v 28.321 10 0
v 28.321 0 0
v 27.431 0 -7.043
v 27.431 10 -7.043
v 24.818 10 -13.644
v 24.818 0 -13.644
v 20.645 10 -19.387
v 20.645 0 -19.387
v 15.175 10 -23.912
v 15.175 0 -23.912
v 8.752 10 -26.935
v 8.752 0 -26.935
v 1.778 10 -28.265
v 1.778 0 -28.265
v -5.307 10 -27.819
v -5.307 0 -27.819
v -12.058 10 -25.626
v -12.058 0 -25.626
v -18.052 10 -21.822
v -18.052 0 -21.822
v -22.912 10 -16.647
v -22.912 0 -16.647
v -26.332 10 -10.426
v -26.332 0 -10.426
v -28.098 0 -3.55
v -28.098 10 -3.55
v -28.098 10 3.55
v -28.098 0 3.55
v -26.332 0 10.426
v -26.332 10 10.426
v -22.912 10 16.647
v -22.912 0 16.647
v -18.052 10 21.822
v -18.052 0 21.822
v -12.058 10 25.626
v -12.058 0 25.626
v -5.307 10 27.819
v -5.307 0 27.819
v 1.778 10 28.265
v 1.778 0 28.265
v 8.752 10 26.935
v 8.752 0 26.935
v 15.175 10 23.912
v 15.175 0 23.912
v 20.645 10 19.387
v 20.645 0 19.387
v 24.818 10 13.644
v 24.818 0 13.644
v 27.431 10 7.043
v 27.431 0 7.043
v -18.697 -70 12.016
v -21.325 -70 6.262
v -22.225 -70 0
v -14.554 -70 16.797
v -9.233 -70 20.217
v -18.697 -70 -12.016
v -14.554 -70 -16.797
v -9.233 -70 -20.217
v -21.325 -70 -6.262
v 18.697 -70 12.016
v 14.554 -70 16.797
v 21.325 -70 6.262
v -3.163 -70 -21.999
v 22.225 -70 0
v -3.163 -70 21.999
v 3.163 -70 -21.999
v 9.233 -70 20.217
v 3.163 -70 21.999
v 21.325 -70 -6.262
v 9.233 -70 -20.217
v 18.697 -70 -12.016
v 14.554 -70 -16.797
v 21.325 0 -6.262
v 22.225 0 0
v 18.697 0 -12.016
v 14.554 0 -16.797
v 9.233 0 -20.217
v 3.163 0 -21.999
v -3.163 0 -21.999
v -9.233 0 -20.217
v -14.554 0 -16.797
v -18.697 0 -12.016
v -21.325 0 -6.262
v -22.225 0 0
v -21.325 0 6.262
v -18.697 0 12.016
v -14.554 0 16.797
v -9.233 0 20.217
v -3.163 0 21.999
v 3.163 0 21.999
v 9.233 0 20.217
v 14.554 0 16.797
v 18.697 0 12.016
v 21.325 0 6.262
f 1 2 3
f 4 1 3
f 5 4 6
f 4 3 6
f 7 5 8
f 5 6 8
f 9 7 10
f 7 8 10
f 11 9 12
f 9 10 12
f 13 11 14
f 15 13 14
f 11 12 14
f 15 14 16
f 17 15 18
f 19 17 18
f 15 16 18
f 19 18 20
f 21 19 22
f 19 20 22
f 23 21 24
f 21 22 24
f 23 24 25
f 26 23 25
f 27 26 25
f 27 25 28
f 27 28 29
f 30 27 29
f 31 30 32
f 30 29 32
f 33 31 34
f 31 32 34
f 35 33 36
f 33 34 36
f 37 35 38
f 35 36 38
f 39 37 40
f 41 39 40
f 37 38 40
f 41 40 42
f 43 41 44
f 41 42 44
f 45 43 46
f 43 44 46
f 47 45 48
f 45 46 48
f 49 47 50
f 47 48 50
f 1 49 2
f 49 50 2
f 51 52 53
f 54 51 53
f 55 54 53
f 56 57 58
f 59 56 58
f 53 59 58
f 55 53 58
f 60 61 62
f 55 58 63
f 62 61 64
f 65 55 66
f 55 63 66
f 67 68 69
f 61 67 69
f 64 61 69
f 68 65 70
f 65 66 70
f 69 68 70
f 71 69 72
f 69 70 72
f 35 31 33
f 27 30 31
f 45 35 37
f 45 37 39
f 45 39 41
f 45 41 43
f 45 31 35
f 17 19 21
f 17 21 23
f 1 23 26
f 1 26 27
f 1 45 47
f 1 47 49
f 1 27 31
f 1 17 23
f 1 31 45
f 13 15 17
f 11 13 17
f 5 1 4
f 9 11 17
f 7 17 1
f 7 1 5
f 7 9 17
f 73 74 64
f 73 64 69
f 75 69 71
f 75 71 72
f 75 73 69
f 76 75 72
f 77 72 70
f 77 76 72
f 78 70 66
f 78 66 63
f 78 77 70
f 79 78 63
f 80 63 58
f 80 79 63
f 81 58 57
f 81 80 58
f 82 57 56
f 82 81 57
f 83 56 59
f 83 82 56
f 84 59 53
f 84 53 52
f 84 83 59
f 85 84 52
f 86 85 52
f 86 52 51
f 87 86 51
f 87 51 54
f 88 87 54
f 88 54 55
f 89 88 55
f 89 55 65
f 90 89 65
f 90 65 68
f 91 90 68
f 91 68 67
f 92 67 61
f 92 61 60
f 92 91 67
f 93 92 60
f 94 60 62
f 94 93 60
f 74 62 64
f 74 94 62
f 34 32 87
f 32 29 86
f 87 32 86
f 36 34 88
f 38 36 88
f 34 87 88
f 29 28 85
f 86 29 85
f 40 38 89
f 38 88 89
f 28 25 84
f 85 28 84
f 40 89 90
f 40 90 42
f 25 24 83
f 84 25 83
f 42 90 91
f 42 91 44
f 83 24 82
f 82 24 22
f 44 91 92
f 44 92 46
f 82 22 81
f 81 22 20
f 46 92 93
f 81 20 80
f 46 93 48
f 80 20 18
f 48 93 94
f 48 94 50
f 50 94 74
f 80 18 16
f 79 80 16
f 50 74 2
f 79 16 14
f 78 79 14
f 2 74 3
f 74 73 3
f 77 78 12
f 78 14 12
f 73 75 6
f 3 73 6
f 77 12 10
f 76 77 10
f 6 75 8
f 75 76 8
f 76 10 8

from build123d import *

# Parameters (mm, degrees)
SKETCH1_R           = 28.321
SKETCH1_R_2         = 22.225
BOSS_EXTRUDE1_DEPTH = 10
SKETCH1_2_R         = 22.225
BOSS_EXTRUDE2_DEPTH = 70
SKETCH1_3_R         = 22.225
BOSS_EXTRUDE3_DEPTH = 10


with BuildPart() as part:
    # Sketch1 → Boss-Extrude1 (new body)
    with BuildSketch(Plane(origin=(0, 0, 0), x_dir=(1, 0, 0), z_dir=(0, 1, 0))):
        Circle(SKETCH1_R)
        Circle(SKETCH1_R_2, mode=Mode.SUBTRACT)
    extrude(amount=BOSS_EXTRUDE1_DEPTH)



with BuildPart() as body_2:
    # Sketch1<2> → Boss-Extrude2 (new body)
    with BuildSketch(Plane(origin=(0, 0, 0), x_dir=(1, 0, 0), z_dir=(0, 1, 0))):
        Circle(SKETCH1_2_R)
    extrude(amount=-BOSS_EXTRUDE2_DEPTH)


with BuildPart() as part_1:
    add(part.part)

    add(body_2.part)  # Boss-Extrude3 merges body 2
    # Sketch1<3> → Boss-Extrude3 (add)
    with BuildSketch(Plane(origin=(0, 0, 0), x_dir=(1, 0, 0), z_dir=(0, 1, 0))):
        Circle(SKETCH1_3_R)
    extrude(amount=BOSS_EXTRUDE3_DEPTH)


solid = part_1.part
